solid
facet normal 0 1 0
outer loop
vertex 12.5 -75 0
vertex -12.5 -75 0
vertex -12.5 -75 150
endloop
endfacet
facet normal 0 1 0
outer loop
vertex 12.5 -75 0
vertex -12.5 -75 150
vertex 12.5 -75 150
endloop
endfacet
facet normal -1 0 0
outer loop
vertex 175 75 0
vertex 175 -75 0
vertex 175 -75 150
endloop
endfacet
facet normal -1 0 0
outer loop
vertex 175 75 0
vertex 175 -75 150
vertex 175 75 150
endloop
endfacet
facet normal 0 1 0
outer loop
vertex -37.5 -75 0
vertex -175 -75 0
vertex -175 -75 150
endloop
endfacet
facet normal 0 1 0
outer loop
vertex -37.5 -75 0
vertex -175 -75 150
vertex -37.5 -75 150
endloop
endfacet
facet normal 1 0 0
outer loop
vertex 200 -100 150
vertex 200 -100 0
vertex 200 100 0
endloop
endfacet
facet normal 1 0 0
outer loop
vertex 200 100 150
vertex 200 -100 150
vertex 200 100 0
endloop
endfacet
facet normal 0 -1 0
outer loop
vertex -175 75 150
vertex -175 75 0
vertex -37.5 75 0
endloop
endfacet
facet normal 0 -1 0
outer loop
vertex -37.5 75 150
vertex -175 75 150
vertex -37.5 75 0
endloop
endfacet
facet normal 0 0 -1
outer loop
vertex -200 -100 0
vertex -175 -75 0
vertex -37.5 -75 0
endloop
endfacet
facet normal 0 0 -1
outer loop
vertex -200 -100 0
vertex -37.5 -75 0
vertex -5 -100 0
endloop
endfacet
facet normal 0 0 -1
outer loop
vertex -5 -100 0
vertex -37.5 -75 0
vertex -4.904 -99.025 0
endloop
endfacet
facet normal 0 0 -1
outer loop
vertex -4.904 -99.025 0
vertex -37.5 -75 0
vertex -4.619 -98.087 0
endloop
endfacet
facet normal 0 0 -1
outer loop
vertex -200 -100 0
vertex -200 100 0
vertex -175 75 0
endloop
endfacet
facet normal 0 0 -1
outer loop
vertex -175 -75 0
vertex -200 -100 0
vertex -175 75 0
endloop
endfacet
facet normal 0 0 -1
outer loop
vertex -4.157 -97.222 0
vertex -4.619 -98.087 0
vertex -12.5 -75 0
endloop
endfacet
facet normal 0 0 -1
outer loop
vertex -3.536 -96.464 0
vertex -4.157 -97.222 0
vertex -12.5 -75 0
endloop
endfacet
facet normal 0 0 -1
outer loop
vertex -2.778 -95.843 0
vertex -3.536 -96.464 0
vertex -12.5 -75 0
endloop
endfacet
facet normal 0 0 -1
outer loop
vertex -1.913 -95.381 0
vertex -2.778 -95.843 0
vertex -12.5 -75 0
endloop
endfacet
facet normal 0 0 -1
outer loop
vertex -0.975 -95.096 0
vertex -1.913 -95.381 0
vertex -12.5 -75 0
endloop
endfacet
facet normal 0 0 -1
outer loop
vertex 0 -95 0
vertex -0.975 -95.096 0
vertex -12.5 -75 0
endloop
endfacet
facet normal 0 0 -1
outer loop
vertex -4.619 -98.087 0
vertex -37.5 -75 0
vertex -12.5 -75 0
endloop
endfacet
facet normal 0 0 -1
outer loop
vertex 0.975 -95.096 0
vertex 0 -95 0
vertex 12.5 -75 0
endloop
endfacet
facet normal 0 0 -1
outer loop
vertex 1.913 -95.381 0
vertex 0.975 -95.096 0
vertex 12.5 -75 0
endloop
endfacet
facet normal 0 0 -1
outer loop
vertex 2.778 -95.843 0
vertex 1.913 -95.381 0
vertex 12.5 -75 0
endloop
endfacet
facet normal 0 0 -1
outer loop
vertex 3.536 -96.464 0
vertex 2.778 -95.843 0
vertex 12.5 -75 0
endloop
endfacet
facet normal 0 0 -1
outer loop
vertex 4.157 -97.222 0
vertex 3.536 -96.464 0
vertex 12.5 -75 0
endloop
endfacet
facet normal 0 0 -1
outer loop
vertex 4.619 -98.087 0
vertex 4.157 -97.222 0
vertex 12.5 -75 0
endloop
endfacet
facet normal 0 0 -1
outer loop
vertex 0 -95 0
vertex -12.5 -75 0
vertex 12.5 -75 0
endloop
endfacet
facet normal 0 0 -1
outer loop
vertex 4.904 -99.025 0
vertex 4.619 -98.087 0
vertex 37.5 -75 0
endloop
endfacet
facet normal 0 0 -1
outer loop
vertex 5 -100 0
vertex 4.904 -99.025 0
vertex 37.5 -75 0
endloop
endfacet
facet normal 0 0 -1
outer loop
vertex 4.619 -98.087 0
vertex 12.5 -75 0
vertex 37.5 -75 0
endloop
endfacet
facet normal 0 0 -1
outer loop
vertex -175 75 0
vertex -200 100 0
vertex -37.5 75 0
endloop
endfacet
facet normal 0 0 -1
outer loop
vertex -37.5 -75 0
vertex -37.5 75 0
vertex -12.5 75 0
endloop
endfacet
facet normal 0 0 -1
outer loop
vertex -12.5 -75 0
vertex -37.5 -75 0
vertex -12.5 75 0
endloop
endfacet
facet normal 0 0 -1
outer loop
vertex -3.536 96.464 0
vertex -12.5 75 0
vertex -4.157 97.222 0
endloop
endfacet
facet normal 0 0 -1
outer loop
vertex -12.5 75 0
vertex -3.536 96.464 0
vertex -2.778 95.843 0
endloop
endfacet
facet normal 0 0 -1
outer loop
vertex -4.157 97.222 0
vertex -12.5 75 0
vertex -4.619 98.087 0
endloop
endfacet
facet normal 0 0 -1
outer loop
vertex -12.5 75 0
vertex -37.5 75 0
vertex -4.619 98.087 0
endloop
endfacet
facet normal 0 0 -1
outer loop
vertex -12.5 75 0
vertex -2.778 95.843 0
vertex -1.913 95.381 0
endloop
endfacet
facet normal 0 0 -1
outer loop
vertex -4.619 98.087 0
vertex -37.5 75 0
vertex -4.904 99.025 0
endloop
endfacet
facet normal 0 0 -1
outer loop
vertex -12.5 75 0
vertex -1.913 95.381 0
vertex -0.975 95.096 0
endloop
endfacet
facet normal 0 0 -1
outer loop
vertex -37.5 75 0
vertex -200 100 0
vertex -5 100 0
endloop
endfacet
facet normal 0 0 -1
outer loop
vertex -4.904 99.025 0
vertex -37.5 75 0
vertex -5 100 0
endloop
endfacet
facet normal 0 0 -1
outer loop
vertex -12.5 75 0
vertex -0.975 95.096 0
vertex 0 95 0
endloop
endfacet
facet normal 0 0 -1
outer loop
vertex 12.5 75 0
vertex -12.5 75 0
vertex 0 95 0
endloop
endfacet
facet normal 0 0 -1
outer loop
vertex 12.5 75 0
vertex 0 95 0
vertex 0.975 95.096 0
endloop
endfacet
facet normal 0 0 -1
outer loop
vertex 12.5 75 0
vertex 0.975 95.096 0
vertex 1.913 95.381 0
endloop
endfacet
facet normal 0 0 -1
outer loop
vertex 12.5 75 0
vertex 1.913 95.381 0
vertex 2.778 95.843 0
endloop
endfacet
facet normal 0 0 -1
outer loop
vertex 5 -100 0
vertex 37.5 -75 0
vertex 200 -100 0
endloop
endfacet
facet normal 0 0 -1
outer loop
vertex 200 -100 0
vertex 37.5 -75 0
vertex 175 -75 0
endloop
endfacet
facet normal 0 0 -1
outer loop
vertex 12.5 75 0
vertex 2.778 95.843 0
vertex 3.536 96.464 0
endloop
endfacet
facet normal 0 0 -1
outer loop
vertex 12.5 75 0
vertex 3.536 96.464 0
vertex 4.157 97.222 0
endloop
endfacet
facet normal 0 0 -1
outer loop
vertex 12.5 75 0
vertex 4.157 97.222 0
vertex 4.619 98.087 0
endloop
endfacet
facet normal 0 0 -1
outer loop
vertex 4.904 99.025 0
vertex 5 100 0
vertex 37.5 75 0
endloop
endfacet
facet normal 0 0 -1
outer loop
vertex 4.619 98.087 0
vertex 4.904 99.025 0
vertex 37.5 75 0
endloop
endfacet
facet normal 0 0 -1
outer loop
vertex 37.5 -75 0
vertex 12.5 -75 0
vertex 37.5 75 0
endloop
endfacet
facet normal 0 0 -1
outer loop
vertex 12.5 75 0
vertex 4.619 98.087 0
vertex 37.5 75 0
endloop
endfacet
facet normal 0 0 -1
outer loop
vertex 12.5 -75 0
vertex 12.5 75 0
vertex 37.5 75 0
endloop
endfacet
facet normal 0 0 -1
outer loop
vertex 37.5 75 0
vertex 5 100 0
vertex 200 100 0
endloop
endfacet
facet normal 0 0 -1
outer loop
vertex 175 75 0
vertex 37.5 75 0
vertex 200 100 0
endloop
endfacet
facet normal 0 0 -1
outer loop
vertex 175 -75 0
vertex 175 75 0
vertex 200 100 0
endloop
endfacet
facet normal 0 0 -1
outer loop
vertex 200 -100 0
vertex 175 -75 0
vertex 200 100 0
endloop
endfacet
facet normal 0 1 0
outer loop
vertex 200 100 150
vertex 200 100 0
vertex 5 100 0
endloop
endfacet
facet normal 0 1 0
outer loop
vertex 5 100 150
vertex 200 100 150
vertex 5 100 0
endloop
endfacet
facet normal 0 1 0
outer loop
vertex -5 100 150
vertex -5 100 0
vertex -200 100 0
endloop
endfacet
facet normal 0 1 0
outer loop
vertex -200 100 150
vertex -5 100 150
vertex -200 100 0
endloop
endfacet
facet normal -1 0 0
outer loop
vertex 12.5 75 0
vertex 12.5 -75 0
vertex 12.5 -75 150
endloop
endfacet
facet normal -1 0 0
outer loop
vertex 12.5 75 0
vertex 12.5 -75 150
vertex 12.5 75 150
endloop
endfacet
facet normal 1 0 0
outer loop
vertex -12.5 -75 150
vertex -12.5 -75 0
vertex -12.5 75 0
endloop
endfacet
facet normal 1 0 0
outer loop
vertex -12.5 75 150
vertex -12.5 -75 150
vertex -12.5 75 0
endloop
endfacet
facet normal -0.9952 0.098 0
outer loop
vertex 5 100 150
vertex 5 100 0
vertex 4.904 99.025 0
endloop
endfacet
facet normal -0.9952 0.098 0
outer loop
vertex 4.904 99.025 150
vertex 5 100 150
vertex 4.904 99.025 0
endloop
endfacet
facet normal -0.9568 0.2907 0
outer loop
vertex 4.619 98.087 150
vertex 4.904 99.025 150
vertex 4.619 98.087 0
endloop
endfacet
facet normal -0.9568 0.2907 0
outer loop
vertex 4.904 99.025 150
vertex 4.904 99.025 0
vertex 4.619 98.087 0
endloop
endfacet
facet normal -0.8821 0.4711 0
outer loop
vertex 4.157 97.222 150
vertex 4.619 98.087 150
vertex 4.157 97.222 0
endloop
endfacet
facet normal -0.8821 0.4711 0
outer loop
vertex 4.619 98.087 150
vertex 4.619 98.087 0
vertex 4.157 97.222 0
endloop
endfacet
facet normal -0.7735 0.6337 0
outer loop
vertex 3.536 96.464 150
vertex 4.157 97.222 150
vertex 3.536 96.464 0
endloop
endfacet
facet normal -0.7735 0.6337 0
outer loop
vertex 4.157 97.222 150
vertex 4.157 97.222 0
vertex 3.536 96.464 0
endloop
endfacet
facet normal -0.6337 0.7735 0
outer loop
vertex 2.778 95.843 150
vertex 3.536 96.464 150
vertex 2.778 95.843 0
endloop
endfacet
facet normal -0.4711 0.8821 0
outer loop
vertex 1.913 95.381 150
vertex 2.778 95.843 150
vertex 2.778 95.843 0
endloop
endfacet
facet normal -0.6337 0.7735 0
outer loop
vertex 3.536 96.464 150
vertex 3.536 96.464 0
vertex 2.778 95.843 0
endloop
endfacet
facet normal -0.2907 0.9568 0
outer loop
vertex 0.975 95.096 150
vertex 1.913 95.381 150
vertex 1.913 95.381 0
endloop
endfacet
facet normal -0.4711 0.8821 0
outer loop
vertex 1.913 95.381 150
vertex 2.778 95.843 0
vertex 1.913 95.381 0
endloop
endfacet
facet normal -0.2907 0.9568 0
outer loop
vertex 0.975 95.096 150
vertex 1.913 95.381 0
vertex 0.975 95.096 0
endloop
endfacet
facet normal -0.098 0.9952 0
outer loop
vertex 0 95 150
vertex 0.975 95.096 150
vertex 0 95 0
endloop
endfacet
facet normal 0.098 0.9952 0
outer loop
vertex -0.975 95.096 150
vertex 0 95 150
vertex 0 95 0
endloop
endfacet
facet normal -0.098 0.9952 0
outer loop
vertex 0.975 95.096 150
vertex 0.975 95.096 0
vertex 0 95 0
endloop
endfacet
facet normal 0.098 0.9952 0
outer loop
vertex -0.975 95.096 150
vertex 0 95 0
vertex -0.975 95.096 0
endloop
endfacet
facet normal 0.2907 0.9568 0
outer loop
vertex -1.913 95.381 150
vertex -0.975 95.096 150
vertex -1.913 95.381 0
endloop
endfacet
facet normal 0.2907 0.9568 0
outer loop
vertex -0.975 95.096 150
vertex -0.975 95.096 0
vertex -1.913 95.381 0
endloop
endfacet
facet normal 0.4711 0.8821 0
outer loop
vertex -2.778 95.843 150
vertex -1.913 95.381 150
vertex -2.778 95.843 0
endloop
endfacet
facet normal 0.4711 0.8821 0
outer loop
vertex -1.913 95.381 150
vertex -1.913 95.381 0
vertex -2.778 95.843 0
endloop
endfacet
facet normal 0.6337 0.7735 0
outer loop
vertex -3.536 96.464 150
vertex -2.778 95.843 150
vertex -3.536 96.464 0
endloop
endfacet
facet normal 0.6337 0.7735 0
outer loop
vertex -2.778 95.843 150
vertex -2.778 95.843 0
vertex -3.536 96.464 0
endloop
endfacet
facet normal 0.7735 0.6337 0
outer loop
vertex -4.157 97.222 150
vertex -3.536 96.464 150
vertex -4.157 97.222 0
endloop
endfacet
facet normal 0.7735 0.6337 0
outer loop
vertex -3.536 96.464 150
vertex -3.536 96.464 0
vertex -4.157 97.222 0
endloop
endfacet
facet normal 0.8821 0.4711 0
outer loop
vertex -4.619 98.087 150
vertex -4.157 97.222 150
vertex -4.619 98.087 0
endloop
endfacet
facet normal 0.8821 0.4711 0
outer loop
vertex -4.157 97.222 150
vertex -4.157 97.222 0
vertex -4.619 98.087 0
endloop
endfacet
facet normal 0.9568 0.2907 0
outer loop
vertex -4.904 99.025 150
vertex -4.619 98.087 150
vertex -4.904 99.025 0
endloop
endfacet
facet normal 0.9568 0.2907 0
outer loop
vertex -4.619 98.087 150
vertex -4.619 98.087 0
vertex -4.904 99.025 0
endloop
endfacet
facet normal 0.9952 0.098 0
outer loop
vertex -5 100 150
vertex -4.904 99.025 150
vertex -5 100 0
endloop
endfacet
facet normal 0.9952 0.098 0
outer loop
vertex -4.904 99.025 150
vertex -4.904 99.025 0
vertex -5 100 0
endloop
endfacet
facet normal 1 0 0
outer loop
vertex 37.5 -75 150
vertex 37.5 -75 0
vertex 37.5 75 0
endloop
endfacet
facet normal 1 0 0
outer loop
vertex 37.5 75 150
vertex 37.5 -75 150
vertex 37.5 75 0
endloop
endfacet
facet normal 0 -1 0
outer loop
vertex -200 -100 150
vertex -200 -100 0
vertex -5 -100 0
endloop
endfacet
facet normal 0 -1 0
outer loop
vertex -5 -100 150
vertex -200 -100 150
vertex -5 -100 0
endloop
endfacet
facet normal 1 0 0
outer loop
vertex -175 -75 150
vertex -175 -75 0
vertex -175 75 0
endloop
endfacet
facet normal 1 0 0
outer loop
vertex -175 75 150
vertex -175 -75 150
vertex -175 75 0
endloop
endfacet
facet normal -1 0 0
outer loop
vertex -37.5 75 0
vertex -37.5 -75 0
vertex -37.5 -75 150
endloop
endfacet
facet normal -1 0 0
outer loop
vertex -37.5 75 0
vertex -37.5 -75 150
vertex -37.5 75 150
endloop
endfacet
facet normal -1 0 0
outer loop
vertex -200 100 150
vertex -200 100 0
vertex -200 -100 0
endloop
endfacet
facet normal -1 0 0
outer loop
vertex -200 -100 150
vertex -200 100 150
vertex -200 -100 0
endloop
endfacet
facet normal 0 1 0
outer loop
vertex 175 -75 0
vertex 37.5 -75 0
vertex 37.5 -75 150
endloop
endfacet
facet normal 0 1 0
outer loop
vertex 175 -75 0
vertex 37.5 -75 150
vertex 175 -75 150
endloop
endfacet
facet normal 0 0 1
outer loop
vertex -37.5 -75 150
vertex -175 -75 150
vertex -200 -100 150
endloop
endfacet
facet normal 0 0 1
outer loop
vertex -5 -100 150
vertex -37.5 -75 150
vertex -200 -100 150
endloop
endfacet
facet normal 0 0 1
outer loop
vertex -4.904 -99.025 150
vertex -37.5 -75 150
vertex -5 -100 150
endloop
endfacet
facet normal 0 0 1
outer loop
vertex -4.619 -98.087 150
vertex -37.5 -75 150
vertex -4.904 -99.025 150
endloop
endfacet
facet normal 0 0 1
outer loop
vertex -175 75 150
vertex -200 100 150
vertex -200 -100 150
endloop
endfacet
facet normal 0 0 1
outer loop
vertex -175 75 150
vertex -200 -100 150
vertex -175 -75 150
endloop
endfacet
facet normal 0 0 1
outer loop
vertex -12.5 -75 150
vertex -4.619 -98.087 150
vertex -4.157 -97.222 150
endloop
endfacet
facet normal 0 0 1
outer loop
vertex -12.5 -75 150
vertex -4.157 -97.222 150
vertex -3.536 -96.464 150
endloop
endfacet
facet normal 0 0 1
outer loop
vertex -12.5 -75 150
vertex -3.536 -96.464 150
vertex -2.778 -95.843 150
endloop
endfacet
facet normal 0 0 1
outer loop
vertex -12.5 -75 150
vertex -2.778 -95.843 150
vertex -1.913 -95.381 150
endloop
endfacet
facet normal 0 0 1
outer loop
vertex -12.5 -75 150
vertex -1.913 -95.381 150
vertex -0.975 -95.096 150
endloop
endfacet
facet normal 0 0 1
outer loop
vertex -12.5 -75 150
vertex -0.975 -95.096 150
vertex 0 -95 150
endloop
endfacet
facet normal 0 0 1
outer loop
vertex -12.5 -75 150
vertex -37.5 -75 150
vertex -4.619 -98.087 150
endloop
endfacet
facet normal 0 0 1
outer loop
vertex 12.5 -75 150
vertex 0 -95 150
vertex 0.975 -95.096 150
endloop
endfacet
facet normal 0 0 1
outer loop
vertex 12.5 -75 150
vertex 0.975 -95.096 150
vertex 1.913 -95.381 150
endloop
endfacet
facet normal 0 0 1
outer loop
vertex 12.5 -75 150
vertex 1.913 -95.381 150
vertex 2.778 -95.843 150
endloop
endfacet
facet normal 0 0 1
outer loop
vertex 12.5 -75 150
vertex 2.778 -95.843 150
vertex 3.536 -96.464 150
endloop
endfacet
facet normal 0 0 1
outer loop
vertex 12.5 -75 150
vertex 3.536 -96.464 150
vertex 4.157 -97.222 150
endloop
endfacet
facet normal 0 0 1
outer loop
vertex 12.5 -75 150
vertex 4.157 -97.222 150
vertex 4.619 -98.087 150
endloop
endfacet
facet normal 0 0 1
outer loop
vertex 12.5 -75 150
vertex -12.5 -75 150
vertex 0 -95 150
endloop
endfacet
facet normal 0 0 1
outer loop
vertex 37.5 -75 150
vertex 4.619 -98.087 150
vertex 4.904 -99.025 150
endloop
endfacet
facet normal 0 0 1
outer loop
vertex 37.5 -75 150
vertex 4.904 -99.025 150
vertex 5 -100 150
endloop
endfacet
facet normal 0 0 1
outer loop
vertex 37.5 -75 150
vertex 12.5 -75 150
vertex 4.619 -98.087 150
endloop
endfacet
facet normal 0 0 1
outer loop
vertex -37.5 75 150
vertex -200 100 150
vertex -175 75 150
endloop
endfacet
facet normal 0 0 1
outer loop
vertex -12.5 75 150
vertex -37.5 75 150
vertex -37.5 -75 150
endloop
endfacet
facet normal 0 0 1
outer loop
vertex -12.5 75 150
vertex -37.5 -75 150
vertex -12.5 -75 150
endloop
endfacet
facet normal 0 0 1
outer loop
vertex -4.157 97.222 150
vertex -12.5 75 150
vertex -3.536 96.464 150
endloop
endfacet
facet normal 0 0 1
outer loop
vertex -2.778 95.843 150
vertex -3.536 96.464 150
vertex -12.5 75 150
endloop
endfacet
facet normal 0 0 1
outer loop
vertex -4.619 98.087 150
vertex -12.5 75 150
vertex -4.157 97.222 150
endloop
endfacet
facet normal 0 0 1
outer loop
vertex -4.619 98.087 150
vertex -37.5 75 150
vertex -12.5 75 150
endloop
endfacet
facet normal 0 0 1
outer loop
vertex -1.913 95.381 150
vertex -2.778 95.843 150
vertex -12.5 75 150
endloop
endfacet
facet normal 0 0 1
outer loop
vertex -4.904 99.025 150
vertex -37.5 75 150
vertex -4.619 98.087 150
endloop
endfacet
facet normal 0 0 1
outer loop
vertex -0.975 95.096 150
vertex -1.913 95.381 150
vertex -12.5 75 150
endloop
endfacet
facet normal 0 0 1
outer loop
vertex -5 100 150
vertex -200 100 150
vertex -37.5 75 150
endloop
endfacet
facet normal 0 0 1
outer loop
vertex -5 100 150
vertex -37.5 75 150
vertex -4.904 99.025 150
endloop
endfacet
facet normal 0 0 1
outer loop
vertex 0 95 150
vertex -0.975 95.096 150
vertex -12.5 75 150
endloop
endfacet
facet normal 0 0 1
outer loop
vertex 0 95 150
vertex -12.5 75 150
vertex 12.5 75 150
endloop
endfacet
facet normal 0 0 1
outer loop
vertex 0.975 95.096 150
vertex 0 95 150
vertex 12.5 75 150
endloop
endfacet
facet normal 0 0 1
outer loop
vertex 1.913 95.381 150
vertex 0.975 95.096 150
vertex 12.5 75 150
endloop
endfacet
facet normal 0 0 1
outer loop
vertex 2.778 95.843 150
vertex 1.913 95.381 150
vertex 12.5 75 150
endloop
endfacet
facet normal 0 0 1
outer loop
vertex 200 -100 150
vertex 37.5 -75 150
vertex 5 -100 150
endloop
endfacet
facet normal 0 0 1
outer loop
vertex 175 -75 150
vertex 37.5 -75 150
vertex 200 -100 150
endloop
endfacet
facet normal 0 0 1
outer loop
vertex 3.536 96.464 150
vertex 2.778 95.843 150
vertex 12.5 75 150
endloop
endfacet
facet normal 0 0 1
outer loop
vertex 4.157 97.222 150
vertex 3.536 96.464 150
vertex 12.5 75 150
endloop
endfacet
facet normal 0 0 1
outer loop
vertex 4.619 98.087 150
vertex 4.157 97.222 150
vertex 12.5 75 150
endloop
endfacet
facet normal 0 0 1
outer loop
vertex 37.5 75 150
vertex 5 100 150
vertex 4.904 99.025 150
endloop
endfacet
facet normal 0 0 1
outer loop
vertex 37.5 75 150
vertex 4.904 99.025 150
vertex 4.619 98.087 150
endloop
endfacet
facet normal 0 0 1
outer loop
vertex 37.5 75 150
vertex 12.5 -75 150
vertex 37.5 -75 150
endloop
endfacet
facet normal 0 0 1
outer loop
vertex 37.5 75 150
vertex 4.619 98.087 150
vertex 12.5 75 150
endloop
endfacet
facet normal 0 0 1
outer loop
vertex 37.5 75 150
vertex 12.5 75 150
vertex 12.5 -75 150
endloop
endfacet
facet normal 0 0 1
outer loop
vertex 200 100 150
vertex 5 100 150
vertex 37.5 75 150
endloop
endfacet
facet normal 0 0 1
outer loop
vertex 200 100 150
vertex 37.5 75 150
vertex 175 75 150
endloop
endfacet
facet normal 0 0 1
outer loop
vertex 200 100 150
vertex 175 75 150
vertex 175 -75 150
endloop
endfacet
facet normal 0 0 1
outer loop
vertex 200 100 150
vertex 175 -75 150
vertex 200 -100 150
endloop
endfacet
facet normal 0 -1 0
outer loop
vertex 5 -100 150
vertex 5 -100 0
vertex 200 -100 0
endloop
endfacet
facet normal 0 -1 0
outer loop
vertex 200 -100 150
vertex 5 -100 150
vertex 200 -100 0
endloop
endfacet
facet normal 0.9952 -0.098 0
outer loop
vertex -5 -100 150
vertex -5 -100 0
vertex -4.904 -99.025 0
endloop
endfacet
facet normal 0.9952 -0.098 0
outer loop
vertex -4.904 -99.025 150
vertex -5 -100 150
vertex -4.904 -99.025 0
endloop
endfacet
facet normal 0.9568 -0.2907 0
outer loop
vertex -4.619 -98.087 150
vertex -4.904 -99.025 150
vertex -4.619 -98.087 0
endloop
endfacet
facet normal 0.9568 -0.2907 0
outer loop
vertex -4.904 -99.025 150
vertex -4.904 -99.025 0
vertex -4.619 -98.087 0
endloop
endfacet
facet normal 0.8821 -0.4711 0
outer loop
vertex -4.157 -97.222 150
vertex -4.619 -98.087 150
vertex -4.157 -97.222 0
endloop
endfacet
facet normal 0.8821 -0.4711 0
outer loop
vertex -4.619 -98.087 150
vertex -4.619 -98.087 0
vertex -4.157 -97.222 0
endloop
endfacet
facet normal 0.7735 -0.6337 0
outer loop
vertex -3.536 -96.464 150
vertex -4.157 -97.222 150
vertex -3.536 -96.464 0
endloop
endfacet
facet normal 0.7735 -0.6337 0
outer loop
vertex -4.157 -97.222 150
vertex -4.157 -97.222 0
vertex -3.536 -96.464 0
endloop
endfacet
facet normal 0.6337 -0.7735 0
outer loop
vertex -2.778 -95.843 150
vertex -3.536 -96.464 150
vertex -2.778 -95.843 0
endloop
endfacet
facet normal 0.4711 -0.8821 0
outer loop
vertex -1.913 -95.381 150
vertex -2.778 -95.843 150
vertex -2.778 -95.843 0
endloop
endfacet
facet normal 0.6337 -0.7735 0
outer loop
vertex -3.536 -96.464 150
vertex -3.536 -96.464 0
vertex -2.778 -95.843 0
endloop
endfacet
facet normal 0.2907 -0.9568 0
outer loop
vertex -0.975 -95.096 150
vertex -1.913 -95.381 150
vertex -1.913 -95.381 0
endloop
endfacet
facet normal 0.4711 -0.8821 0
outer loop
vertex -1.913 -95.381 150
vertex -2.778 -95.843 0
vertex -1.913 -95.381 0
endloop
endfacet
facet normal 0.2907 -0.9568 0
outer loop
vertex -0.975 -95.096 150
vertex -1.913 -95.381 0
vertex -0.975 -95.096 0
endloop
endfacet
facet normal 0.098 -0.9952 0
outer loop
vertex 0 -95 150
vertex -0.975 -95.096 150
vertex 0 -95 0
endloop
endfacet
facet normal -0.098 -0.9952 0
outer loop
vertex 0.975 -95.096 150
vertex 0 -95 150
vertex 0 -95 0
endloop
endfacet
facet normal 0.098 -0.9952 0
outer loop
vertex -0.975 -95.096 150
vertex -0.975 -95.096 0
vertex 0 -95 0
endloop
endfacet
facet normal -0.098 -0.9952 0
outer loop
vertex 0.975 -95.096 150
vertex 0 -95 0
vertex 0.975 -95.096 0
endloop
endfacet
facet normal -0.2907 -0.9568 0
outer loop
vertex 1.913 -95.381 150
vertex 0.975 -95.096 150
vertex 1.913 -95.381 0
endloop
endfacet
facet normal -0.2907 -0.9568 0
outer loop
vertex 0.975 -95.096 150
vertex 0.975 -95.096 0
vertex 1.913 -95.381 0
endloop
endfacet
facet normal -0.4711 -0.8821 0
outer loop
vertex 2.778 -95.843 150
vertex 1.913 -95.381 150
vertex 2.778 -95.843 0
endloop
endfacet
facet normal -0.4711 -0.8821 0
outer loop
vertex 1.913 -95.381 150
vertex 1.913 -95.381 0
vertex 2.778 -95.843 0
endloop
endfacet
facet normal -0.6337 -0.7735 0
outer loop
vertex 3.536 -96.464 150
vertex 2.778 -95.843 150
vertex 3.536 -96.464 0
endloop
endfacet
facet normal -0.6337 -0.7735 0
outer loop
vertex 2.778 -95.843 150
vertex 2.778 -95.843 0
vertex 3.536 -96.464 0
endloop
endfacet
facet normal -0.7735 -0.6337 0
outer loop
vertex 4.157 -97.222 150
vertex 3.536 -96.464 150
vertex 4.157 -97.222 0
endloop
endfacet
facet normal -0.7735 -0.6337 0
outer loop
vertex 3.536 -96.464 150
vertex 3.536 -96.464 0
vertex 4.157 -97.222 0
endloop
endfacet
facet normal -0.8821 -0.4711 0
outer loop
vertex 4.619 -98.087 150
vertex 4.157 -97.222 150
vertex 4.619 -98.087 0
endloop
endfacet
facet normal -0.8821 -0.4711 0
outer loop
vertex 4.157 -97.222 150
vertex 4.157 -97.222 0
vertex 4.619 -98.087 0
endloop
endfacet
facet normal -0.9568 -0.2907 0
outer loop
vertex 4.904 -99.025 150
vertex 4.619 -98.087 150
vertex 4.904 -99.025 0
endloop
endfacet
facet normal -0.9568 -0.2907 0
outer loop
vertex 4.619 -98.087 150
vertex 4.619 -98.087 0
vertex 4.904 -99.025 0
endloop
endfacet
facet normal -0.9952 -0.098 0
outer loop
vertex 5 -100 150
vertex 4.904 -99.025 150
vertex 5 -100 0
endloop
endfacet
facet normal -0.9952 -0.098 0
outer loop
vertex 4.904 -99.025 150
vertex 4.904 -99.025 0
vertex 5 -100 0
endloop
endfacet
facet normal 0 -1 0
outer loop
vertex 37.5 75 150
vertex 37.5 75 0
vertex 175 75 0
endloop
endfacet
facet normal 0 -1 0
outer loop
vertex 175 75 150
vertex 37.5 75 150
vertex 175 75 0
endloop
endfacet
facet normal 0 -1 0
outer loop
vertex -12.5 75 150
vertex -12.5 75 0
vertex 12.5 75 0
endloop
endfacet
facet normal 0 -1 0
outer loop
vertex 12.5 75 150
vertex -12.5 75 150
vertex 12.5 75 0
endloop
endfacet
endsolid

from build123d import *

# Parameters (mm, degrees)
F0_W     = 137.5
F0_H     = 150
F0_W_2   = 25
F1_DEPTH = 150


with BuildPart() as f1:
    # F0 (on Top) → F1 (new body)
    with BuildSketch(Plane.XY):
        with BuildLine():
            Line((200, -100), (200, 100))
            Line((200, 100), (5, 100))
            ThreePointArc((5, 100), (0, 95), (-5, 100))
            Line((-5, 100), (-200, 100))
            Line((-200, 100), (-200, -100))
            Line((-200, -100), (-5, -100))
            ThreePointArc((-5, -100), (0, -95), (5, -100))
            Line((5, -100), (200, -100))
        make_face()
        with Locations((-106.25, 0)):
            Rectangle(F0_W, F0_H, mode=Mode.SUBTRACT)
        Rectangle(F0_W_2, F0_H, mode=Mode.SUBTRACT)
        with Locations((106.25, 0)):
            Rectangle(F0_W, F0_H, mode=Mode.SUBTRACT)
    extrude(amount=F1_DEPTH)


solid = f1.part
